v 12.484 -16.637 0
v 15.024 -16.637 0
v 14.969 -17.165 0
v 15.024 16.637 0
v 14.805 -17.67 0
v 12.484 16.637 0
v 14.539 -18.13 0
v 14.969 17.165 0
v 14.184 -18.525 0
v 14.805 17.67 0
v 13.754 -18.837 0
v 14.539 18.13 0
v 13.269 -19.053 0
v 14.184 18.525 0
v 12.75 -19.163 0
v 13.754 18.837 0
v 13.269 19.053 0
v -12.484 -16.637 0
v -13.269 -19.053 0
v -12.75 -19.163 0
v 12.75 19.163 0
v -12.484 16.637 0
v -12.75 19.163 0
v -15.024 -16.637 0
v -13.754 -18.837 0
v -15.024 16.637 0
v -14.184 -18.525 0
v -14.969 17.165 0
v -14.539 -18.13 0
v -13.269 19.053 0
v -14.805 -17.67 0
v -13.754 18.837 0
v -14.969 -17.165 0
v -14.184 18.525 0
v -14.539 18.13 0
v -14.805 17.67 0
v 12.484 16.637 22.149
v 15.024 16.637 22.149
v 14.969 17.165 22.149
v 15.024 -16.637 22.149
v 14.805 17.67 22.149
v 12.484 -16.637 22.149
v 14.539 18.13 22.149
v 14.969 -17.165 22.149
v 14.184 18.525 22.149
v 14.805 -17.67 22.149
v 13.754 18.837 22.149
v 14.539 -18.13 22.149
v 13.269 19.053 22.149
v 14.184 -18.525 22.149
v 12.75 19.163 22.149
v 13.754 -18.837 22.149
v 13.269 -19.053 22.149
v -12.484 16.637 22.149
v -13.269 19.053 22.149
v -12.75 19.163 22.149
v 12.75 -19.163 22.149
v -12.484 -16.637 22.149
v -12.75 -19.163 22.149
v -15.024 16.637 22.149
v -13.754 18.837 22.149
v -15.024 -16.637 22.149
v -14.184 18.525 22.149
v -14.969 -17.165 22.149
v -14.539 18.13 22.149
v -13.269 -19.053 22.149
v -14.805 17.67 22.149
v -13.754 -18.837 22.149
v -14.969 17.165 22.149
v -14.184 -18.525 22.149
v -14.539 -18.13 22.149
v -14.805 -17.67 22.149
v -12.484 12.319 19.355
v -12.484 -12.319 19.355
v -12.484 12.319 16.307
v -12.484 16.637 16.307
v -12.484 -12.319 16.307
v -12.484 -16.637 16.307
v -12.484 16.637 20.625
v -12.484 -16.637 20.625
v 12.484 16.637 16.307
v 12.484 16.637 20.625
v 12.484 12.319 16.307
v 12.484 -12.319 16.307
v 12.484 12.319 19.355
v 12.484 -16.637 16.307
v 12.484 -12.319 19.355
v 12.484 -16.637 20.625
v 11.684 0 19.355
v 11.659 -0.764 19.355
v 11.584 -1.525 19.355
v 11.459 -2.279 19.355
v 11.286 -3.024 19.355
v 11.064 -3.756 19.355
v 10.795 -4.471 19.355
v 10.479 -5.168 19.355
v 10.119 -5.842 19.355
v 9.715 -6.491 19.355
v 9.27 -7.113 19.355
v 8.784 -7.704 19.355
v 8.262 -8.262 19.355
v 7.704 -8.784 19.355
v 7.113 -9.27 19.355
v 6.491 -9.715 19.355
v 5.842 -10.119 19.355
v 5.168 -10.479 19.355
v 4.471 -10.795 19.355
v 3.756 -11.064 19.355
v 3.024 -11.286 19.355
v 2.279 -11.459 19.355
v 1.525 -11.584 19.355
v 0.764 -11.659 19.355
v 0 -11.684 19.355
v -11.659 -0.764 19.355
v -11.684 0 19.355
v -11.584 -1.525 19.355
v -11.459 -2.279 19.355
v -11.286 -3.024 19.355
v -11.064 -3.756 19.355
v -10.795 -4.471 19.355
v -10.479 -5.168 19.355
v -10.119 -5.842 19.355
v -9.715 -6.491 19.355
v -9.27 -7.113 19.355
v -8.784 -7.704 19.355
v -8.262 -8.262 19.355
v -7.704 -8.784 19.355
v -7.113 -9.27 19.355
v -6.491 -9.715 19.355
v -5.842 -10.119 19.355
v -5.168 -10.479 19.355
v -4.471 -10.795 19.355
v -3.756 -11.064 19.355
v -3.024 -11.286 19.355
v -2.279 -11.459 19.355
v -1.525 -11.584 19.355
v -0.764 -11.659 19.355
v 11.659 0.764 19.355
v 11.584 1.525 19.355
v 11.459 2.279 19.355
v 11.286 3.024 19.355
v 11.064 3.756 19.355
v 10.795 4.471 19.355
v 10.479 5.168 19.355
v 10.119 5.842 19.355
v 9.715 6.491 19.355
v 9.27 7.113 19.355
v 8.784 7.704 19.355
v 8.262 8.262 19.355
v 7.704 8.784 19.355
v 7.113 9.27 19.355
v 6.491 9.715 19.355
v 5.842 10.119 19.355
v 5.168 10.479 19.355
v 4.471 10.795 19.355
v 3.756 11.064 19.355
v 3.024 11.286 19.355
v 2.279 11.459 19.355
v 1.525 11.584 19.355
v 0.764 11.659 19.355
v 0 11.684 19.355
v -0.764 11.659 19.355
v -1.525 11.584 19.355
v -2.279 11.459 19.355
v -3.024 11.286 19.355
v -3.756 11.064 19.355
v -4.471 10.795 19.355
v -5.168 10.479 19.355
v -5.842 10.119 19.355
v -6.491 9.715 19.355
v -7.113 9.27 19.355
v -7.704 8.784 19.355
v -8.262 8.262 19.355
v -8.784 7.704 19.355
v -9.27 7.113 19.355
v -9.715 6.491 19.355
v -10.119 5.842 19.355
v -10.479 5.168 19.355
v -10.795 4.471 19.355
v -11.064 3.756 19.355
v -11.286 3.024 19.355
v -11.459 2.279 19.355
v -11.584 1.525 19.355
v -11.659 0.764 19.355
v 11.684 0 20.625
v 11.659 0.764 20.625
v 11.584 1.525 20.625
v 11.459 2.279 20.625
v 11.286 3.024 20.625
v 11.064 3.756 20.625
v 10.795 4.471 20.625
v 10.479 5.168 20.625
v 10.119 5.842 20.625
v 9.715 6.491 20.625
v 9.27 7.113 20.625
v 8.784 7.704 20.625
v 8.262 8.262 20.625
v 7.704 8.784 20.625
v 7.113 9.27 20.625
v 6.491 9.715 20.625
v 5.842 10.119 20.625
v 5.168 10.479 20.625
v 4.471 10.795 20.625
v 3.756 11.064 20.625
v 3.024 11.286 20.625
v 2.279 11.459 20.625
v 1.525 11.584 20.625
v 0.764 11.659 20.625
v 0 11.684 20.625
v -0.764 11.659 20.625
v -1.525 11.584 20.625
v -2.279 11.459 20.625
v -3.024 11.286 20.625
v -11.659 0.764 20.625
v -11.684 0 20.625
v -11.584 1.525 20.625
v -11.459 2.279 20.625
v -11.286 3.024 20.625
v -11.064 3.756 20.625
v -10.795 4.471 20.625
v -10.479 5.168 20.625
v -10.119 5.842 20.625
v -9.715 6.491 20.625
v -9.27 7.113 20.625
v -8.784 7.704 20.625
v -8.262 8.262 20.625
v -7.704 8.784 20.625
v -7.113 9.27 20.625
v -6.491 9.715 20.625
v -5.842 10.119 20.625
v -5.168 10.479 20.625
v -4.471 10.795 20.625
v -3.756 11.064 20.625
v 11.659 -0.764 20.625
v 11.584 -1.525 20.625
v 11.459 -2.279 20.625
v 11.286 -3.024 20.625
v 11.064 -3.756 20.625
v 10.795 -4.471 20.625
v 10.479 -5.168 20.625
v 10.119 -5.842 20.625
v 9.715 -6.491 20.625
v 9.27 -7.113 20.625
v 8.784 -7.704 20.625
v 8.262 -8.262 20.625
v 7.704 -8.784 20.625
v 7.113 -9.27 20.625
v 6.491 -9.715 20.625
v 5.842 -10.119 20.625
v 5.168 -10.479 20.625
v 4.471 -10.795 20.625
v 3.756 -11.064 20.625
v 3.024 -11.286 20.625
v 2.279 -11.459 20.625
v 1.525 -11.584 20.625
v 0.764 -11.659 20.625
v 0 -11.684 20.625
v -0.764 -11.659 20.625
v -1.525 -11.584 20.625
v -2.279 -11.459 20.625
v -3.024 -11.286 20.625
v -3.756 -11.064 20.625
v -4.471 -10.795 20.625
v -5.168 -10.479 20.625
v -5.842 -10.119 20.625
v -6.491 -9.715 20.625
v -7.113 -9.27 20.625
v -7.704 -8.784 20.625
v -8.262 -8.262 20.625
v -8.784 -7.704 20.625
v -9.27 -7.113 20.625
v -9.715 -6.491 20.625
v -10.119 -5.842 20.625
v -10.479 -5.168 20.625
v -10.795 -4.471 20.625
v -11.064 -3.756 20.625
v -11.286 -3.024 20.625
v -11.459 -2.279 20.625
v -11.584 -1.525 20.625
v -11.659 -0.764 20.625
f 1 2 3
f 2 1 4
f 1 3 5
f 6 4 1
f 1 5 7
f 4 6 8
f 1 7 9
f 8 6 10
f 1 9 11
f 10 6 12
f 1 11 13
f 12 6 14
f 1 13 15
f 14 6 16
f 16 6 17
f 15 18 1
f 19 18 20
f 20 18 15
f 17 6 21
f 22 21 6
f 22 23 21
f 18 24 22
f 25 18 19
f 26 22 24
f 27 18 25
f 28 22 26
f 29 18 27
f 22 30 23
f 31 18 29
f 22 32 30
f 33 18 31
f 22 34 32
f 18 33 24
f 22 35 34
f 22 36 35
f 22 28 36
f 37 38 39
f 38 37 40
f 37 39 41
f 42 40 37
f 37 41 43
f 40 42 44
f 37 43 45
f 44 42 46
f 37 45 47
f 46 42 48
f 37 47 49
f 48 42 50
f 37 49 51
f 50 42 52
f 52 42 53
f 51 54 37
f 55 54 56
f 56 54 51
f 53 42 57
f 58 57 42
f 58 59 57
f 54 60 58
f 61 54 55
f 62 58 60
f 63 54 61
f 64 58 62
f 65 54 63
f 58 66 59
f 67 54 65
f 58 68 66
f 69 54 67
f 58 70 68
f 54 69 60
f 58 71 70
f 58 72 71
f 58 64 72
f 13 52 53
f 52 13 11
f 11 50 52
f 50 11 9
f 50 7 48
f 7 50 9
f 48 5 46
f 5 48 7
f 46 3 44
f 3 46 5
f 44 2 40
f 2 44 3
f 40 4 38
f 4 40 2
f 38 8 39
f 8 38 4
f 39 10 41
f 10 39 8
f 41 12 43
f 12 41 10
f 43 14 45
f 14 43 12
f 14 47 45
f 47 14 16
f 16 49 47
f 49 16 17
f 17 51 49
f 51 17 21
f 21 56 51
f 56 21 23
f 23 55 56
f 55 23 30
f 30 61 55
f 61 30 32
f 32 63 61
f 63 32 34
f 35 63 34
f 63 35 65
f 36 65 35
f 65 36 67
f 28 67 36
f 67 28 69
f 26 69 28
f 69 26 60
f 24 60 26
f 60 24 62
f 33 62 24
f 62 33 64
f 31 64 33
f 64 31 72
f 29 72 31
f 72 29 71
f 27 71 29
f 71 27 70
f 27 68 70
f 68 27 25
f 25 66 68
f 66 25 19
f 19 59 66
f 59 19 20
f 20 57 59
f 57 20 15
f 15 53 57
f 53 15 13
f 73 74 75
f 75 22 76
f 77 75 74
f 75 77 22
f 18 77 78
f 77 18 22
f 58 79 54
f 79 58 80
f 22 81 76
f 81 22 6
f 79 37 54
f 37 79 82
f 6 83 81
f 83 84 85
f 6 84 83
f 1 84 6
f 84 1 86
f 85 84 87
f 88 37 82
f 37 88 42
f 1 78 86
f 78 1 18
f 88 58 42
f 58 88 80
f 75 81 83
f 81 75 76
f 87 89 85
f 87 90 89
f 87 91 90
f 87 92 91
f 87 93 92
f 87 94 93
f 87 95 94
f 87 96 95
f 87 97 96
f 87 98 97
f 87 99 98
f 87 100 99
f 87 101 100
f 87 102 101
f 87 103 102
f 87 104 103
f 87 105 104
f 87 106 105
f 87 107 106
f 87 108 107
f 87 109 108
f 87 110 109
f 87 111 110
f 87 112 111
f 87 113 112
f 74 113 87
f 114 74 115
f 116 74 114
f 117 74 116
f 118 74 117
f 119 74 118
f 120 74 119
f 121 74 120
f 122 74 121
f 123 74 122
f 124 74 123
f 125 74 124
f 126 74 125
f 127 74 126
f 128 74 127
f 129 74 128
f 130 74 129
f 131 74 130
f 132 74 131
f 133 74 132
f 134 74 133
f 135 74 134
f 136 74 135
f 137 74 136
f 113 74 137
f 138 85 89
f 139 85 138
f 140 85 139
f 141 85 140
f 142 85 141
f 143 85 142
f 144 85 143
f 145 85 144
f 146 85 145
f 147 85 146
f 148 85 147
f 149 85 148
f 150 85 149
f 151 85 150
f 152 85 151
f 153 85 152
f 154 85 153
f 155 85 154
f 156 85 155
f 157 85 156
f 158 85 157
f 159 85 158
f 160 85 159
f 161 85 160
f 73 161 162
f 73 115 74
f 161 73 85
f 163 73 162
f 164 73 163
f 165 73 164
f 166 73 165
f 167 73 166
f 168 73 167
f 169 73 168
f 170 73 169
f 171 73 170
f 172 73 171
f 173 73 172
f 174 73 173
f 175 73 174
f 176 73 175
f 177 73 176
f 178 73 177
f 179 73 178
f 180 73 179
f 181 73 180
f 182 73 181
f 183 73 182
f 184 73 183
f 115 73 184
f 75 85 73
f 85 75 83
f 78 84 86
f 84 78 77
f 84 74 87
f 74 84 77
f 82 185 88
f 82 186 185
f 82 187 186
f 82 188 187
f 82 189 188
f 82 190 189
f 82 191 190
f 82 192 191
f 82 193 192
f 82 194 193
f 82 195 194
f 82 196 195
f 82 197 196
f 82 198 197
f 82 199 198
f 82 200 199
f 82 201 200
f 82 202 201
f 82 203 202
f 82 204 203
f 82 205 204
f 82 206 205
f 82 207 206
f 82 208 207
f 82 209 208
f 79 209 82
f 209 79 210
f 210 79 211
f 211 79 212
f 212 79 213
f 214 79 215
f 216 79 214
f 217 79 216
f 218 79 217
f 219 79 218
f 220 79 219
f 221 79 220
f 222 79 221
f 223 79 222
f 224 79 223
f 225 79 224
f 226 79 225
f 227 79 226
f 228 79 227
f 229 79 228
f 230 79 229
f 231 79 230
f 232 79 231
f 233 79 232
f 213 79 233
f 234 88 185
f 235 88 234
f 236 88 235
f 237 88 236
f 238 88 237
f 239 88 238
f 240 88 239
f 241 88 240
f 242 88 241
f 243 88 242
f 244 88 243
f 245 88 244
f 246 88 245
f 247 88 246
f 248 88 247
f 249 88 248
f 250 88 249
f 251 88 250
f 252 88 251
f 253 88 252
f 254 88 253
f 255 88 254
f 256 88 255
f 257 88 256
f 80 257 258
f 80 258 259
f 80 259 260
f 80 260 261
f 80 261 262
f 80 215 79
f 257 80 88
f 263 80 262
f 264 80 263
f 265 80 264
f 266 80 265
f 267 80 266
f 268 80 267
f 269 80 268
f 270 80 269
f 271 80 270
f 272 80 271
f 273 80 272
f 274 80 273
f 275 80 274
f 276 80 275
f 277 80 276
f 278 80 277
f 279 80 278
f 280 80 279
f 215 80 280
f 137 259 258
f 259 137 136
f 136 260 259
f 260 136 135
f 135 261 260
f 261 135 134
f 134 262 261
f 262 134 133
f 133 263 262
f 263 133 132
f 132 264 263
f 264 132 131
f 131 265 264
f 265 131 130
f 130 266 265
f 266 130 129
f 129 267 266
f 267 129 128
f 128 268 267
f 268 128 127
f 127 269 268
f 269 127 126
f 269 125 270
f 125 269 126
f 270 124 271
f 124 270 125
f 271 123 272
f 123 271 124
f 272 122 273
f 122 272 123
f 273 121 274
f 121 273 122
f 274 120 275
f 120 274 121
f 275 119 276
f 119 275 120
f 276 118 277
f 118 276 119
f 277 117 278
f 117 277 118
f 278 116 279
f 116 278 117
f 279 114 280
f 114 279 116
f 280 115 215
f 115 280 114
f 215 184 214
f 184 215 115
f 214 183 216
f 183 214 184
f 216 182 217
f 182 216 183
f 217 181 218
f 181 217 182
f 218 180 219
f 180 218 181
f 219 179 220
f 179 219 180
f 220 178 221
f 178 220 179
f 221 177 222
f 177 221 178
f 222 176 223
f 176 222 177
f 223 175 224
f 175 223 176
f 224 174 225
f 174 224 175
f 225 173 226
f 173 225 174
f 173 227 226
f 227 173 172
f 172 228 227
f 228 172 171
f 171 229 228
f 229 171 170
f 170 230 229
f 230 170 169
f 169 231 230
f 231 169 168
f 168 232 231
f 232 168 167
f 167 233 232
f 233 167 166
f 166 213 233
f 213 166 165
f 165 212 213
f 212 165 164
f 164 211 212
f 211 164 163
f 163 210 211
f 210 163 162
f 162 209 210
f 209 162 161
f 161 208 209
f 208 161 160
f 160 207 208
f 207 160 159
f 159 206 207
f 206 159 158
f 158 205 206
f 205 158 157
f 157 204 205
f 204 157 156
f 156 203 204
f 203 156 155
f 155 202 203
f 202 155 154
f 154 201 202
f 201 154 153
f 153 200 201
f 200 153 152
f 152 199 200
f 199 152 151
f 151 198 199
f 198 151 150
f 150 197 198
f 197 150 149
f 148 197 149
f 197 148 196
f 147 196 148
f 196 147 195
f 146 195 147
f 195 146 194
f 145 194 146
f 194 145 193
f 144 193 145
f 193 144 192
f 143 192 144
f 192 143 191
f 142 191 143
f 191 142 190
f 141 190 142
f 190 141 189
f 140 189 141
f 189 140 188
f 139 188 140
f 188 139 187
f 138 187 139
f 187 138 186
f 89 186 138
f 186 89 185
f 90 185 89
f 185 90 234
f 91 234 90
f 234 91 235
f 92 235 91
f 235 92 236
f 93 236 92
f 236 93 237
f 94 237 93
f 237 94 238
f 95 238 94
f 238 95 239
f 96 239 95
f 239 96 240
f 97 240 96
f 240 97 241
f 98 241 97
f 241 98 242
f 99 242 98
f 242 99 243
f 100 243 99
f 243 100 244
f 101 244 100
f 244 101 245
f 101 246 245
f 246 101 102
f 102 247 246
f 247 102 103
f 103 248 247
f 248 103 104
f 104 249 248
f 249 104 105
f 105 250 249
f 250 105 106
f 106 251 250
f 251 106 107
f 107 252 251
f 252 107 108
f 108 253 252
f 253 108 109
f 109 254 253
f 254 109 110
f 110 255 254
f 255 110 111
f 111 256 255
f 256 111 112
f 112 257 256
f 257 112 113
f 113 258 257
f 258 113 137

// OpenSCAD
// file: model_pirdetector.scad
module model_pirdetector()
{
    color("CornflowerBlue")
    {
    // Cover base
    translate([0, 0, 350+65])
    linear_extrude(140)
    square(910, center=true);

    // Cover
    translate([0, 0, 550+65-140])
    rotate_extrude()
    intersection() {
    circle(450, $fn=96);
    square(500);
    }

    // PCB
    translate([0, 0, 350])
    linear_extrude(65)
    difference() {
    square([953, 1280], center=true);
    translate([0, (1280-80)/2-35, 0])
    circle(40, $fn=96);
    translate([0, -(1280-80)/2+35, 0])
    circle(40, $fn=96);
    }

    // Cap
    translate([(953-164)/2, (1280-164)/2, 0])
    linear_extrude(350)
    circle(164/2, center=true);

    // Cap
    translate([(953-164)/2, -(1280-164)/2, 0])
    linear_extrude(350)
    circle(164/2, center=true);

    // Cap
    translate([-(953-164)/2, (1280-164)/2, 0])
    linear_extrude(350)
    circle(164/2, center=true);

    // Inset Cap
    translate([-(953-164)/2, -(1280-164)/2+220, 0])
    linear_extrude(350)
    circle(164/2, center=true);

    // I/O Header
    translate([(953-100)/2, 0, 0])
    linear_extrude(350)
    square([100, 300], center=true);

    // Jumper Header
    translate([-(953-300)/2+20, -(1280-100)/2+20, 0])
    linear_extrude(350)
    square([300, 100], center=true);

    // Pots
    translate([-(953-180)/2, -(1280-580)/2+440, 0])
    linear_extrude(350)
    square([180, 580], center=true);

    // Chips
    translate([0, 0, 290])
    linear_extrude(60)
    difference() {
    square([953-300, 1280-300], center=true);
    translate([0, (1280-75)/2-35, 0])
    circle(150, $fn=96);
    translate([0, -(1280-75)/2+35, 0])
    circle(150, $fn=96);
    }
    }
}
// main file
use <model_pirdetector.scad>

ViewScale = [0.0254, 0.0254, 0.0254];

module rectHull(r, x, y)
{
    hull()
    {
        translate([(-x/2)+r, (-y/2)+r, 0]) circle(r=r);
        translate([(x/2)-r, (-y/2)+r, 0]) circle(r=r);
        translate([(-x/2)+r, (y/2)-r, 0]) circle(r=r);
        translate([(x/2)-r, (y/2)-r, 0]) circle(r=r);
    }
}

module enclosure_pirDetector()
{
    // outside cover
    linear_extrude(872) 
    difference() {
        rectHull(100, 1183, 1510);
        square([983, 1310], center=true);
    }

    // Right support
    translate([0, (1280-140)/2, 350+65+227])
    linear_extrude(120)
    square([1000, 170], center=true);

    // Left support
    translate([0, -(1280-140)/2, 350+65+227])
    linear_extrude(120)
    square([1000, 170], center=true);

    // Dome base
    translate([0, 0, 762])
    linear_extrude(50)
    difference() {
        rectHull(100, 1183, 1510);
        circle(460, $fn=96);
    }
}

scale(ViewScale)
{
    enclosure_pirDetector();
}
